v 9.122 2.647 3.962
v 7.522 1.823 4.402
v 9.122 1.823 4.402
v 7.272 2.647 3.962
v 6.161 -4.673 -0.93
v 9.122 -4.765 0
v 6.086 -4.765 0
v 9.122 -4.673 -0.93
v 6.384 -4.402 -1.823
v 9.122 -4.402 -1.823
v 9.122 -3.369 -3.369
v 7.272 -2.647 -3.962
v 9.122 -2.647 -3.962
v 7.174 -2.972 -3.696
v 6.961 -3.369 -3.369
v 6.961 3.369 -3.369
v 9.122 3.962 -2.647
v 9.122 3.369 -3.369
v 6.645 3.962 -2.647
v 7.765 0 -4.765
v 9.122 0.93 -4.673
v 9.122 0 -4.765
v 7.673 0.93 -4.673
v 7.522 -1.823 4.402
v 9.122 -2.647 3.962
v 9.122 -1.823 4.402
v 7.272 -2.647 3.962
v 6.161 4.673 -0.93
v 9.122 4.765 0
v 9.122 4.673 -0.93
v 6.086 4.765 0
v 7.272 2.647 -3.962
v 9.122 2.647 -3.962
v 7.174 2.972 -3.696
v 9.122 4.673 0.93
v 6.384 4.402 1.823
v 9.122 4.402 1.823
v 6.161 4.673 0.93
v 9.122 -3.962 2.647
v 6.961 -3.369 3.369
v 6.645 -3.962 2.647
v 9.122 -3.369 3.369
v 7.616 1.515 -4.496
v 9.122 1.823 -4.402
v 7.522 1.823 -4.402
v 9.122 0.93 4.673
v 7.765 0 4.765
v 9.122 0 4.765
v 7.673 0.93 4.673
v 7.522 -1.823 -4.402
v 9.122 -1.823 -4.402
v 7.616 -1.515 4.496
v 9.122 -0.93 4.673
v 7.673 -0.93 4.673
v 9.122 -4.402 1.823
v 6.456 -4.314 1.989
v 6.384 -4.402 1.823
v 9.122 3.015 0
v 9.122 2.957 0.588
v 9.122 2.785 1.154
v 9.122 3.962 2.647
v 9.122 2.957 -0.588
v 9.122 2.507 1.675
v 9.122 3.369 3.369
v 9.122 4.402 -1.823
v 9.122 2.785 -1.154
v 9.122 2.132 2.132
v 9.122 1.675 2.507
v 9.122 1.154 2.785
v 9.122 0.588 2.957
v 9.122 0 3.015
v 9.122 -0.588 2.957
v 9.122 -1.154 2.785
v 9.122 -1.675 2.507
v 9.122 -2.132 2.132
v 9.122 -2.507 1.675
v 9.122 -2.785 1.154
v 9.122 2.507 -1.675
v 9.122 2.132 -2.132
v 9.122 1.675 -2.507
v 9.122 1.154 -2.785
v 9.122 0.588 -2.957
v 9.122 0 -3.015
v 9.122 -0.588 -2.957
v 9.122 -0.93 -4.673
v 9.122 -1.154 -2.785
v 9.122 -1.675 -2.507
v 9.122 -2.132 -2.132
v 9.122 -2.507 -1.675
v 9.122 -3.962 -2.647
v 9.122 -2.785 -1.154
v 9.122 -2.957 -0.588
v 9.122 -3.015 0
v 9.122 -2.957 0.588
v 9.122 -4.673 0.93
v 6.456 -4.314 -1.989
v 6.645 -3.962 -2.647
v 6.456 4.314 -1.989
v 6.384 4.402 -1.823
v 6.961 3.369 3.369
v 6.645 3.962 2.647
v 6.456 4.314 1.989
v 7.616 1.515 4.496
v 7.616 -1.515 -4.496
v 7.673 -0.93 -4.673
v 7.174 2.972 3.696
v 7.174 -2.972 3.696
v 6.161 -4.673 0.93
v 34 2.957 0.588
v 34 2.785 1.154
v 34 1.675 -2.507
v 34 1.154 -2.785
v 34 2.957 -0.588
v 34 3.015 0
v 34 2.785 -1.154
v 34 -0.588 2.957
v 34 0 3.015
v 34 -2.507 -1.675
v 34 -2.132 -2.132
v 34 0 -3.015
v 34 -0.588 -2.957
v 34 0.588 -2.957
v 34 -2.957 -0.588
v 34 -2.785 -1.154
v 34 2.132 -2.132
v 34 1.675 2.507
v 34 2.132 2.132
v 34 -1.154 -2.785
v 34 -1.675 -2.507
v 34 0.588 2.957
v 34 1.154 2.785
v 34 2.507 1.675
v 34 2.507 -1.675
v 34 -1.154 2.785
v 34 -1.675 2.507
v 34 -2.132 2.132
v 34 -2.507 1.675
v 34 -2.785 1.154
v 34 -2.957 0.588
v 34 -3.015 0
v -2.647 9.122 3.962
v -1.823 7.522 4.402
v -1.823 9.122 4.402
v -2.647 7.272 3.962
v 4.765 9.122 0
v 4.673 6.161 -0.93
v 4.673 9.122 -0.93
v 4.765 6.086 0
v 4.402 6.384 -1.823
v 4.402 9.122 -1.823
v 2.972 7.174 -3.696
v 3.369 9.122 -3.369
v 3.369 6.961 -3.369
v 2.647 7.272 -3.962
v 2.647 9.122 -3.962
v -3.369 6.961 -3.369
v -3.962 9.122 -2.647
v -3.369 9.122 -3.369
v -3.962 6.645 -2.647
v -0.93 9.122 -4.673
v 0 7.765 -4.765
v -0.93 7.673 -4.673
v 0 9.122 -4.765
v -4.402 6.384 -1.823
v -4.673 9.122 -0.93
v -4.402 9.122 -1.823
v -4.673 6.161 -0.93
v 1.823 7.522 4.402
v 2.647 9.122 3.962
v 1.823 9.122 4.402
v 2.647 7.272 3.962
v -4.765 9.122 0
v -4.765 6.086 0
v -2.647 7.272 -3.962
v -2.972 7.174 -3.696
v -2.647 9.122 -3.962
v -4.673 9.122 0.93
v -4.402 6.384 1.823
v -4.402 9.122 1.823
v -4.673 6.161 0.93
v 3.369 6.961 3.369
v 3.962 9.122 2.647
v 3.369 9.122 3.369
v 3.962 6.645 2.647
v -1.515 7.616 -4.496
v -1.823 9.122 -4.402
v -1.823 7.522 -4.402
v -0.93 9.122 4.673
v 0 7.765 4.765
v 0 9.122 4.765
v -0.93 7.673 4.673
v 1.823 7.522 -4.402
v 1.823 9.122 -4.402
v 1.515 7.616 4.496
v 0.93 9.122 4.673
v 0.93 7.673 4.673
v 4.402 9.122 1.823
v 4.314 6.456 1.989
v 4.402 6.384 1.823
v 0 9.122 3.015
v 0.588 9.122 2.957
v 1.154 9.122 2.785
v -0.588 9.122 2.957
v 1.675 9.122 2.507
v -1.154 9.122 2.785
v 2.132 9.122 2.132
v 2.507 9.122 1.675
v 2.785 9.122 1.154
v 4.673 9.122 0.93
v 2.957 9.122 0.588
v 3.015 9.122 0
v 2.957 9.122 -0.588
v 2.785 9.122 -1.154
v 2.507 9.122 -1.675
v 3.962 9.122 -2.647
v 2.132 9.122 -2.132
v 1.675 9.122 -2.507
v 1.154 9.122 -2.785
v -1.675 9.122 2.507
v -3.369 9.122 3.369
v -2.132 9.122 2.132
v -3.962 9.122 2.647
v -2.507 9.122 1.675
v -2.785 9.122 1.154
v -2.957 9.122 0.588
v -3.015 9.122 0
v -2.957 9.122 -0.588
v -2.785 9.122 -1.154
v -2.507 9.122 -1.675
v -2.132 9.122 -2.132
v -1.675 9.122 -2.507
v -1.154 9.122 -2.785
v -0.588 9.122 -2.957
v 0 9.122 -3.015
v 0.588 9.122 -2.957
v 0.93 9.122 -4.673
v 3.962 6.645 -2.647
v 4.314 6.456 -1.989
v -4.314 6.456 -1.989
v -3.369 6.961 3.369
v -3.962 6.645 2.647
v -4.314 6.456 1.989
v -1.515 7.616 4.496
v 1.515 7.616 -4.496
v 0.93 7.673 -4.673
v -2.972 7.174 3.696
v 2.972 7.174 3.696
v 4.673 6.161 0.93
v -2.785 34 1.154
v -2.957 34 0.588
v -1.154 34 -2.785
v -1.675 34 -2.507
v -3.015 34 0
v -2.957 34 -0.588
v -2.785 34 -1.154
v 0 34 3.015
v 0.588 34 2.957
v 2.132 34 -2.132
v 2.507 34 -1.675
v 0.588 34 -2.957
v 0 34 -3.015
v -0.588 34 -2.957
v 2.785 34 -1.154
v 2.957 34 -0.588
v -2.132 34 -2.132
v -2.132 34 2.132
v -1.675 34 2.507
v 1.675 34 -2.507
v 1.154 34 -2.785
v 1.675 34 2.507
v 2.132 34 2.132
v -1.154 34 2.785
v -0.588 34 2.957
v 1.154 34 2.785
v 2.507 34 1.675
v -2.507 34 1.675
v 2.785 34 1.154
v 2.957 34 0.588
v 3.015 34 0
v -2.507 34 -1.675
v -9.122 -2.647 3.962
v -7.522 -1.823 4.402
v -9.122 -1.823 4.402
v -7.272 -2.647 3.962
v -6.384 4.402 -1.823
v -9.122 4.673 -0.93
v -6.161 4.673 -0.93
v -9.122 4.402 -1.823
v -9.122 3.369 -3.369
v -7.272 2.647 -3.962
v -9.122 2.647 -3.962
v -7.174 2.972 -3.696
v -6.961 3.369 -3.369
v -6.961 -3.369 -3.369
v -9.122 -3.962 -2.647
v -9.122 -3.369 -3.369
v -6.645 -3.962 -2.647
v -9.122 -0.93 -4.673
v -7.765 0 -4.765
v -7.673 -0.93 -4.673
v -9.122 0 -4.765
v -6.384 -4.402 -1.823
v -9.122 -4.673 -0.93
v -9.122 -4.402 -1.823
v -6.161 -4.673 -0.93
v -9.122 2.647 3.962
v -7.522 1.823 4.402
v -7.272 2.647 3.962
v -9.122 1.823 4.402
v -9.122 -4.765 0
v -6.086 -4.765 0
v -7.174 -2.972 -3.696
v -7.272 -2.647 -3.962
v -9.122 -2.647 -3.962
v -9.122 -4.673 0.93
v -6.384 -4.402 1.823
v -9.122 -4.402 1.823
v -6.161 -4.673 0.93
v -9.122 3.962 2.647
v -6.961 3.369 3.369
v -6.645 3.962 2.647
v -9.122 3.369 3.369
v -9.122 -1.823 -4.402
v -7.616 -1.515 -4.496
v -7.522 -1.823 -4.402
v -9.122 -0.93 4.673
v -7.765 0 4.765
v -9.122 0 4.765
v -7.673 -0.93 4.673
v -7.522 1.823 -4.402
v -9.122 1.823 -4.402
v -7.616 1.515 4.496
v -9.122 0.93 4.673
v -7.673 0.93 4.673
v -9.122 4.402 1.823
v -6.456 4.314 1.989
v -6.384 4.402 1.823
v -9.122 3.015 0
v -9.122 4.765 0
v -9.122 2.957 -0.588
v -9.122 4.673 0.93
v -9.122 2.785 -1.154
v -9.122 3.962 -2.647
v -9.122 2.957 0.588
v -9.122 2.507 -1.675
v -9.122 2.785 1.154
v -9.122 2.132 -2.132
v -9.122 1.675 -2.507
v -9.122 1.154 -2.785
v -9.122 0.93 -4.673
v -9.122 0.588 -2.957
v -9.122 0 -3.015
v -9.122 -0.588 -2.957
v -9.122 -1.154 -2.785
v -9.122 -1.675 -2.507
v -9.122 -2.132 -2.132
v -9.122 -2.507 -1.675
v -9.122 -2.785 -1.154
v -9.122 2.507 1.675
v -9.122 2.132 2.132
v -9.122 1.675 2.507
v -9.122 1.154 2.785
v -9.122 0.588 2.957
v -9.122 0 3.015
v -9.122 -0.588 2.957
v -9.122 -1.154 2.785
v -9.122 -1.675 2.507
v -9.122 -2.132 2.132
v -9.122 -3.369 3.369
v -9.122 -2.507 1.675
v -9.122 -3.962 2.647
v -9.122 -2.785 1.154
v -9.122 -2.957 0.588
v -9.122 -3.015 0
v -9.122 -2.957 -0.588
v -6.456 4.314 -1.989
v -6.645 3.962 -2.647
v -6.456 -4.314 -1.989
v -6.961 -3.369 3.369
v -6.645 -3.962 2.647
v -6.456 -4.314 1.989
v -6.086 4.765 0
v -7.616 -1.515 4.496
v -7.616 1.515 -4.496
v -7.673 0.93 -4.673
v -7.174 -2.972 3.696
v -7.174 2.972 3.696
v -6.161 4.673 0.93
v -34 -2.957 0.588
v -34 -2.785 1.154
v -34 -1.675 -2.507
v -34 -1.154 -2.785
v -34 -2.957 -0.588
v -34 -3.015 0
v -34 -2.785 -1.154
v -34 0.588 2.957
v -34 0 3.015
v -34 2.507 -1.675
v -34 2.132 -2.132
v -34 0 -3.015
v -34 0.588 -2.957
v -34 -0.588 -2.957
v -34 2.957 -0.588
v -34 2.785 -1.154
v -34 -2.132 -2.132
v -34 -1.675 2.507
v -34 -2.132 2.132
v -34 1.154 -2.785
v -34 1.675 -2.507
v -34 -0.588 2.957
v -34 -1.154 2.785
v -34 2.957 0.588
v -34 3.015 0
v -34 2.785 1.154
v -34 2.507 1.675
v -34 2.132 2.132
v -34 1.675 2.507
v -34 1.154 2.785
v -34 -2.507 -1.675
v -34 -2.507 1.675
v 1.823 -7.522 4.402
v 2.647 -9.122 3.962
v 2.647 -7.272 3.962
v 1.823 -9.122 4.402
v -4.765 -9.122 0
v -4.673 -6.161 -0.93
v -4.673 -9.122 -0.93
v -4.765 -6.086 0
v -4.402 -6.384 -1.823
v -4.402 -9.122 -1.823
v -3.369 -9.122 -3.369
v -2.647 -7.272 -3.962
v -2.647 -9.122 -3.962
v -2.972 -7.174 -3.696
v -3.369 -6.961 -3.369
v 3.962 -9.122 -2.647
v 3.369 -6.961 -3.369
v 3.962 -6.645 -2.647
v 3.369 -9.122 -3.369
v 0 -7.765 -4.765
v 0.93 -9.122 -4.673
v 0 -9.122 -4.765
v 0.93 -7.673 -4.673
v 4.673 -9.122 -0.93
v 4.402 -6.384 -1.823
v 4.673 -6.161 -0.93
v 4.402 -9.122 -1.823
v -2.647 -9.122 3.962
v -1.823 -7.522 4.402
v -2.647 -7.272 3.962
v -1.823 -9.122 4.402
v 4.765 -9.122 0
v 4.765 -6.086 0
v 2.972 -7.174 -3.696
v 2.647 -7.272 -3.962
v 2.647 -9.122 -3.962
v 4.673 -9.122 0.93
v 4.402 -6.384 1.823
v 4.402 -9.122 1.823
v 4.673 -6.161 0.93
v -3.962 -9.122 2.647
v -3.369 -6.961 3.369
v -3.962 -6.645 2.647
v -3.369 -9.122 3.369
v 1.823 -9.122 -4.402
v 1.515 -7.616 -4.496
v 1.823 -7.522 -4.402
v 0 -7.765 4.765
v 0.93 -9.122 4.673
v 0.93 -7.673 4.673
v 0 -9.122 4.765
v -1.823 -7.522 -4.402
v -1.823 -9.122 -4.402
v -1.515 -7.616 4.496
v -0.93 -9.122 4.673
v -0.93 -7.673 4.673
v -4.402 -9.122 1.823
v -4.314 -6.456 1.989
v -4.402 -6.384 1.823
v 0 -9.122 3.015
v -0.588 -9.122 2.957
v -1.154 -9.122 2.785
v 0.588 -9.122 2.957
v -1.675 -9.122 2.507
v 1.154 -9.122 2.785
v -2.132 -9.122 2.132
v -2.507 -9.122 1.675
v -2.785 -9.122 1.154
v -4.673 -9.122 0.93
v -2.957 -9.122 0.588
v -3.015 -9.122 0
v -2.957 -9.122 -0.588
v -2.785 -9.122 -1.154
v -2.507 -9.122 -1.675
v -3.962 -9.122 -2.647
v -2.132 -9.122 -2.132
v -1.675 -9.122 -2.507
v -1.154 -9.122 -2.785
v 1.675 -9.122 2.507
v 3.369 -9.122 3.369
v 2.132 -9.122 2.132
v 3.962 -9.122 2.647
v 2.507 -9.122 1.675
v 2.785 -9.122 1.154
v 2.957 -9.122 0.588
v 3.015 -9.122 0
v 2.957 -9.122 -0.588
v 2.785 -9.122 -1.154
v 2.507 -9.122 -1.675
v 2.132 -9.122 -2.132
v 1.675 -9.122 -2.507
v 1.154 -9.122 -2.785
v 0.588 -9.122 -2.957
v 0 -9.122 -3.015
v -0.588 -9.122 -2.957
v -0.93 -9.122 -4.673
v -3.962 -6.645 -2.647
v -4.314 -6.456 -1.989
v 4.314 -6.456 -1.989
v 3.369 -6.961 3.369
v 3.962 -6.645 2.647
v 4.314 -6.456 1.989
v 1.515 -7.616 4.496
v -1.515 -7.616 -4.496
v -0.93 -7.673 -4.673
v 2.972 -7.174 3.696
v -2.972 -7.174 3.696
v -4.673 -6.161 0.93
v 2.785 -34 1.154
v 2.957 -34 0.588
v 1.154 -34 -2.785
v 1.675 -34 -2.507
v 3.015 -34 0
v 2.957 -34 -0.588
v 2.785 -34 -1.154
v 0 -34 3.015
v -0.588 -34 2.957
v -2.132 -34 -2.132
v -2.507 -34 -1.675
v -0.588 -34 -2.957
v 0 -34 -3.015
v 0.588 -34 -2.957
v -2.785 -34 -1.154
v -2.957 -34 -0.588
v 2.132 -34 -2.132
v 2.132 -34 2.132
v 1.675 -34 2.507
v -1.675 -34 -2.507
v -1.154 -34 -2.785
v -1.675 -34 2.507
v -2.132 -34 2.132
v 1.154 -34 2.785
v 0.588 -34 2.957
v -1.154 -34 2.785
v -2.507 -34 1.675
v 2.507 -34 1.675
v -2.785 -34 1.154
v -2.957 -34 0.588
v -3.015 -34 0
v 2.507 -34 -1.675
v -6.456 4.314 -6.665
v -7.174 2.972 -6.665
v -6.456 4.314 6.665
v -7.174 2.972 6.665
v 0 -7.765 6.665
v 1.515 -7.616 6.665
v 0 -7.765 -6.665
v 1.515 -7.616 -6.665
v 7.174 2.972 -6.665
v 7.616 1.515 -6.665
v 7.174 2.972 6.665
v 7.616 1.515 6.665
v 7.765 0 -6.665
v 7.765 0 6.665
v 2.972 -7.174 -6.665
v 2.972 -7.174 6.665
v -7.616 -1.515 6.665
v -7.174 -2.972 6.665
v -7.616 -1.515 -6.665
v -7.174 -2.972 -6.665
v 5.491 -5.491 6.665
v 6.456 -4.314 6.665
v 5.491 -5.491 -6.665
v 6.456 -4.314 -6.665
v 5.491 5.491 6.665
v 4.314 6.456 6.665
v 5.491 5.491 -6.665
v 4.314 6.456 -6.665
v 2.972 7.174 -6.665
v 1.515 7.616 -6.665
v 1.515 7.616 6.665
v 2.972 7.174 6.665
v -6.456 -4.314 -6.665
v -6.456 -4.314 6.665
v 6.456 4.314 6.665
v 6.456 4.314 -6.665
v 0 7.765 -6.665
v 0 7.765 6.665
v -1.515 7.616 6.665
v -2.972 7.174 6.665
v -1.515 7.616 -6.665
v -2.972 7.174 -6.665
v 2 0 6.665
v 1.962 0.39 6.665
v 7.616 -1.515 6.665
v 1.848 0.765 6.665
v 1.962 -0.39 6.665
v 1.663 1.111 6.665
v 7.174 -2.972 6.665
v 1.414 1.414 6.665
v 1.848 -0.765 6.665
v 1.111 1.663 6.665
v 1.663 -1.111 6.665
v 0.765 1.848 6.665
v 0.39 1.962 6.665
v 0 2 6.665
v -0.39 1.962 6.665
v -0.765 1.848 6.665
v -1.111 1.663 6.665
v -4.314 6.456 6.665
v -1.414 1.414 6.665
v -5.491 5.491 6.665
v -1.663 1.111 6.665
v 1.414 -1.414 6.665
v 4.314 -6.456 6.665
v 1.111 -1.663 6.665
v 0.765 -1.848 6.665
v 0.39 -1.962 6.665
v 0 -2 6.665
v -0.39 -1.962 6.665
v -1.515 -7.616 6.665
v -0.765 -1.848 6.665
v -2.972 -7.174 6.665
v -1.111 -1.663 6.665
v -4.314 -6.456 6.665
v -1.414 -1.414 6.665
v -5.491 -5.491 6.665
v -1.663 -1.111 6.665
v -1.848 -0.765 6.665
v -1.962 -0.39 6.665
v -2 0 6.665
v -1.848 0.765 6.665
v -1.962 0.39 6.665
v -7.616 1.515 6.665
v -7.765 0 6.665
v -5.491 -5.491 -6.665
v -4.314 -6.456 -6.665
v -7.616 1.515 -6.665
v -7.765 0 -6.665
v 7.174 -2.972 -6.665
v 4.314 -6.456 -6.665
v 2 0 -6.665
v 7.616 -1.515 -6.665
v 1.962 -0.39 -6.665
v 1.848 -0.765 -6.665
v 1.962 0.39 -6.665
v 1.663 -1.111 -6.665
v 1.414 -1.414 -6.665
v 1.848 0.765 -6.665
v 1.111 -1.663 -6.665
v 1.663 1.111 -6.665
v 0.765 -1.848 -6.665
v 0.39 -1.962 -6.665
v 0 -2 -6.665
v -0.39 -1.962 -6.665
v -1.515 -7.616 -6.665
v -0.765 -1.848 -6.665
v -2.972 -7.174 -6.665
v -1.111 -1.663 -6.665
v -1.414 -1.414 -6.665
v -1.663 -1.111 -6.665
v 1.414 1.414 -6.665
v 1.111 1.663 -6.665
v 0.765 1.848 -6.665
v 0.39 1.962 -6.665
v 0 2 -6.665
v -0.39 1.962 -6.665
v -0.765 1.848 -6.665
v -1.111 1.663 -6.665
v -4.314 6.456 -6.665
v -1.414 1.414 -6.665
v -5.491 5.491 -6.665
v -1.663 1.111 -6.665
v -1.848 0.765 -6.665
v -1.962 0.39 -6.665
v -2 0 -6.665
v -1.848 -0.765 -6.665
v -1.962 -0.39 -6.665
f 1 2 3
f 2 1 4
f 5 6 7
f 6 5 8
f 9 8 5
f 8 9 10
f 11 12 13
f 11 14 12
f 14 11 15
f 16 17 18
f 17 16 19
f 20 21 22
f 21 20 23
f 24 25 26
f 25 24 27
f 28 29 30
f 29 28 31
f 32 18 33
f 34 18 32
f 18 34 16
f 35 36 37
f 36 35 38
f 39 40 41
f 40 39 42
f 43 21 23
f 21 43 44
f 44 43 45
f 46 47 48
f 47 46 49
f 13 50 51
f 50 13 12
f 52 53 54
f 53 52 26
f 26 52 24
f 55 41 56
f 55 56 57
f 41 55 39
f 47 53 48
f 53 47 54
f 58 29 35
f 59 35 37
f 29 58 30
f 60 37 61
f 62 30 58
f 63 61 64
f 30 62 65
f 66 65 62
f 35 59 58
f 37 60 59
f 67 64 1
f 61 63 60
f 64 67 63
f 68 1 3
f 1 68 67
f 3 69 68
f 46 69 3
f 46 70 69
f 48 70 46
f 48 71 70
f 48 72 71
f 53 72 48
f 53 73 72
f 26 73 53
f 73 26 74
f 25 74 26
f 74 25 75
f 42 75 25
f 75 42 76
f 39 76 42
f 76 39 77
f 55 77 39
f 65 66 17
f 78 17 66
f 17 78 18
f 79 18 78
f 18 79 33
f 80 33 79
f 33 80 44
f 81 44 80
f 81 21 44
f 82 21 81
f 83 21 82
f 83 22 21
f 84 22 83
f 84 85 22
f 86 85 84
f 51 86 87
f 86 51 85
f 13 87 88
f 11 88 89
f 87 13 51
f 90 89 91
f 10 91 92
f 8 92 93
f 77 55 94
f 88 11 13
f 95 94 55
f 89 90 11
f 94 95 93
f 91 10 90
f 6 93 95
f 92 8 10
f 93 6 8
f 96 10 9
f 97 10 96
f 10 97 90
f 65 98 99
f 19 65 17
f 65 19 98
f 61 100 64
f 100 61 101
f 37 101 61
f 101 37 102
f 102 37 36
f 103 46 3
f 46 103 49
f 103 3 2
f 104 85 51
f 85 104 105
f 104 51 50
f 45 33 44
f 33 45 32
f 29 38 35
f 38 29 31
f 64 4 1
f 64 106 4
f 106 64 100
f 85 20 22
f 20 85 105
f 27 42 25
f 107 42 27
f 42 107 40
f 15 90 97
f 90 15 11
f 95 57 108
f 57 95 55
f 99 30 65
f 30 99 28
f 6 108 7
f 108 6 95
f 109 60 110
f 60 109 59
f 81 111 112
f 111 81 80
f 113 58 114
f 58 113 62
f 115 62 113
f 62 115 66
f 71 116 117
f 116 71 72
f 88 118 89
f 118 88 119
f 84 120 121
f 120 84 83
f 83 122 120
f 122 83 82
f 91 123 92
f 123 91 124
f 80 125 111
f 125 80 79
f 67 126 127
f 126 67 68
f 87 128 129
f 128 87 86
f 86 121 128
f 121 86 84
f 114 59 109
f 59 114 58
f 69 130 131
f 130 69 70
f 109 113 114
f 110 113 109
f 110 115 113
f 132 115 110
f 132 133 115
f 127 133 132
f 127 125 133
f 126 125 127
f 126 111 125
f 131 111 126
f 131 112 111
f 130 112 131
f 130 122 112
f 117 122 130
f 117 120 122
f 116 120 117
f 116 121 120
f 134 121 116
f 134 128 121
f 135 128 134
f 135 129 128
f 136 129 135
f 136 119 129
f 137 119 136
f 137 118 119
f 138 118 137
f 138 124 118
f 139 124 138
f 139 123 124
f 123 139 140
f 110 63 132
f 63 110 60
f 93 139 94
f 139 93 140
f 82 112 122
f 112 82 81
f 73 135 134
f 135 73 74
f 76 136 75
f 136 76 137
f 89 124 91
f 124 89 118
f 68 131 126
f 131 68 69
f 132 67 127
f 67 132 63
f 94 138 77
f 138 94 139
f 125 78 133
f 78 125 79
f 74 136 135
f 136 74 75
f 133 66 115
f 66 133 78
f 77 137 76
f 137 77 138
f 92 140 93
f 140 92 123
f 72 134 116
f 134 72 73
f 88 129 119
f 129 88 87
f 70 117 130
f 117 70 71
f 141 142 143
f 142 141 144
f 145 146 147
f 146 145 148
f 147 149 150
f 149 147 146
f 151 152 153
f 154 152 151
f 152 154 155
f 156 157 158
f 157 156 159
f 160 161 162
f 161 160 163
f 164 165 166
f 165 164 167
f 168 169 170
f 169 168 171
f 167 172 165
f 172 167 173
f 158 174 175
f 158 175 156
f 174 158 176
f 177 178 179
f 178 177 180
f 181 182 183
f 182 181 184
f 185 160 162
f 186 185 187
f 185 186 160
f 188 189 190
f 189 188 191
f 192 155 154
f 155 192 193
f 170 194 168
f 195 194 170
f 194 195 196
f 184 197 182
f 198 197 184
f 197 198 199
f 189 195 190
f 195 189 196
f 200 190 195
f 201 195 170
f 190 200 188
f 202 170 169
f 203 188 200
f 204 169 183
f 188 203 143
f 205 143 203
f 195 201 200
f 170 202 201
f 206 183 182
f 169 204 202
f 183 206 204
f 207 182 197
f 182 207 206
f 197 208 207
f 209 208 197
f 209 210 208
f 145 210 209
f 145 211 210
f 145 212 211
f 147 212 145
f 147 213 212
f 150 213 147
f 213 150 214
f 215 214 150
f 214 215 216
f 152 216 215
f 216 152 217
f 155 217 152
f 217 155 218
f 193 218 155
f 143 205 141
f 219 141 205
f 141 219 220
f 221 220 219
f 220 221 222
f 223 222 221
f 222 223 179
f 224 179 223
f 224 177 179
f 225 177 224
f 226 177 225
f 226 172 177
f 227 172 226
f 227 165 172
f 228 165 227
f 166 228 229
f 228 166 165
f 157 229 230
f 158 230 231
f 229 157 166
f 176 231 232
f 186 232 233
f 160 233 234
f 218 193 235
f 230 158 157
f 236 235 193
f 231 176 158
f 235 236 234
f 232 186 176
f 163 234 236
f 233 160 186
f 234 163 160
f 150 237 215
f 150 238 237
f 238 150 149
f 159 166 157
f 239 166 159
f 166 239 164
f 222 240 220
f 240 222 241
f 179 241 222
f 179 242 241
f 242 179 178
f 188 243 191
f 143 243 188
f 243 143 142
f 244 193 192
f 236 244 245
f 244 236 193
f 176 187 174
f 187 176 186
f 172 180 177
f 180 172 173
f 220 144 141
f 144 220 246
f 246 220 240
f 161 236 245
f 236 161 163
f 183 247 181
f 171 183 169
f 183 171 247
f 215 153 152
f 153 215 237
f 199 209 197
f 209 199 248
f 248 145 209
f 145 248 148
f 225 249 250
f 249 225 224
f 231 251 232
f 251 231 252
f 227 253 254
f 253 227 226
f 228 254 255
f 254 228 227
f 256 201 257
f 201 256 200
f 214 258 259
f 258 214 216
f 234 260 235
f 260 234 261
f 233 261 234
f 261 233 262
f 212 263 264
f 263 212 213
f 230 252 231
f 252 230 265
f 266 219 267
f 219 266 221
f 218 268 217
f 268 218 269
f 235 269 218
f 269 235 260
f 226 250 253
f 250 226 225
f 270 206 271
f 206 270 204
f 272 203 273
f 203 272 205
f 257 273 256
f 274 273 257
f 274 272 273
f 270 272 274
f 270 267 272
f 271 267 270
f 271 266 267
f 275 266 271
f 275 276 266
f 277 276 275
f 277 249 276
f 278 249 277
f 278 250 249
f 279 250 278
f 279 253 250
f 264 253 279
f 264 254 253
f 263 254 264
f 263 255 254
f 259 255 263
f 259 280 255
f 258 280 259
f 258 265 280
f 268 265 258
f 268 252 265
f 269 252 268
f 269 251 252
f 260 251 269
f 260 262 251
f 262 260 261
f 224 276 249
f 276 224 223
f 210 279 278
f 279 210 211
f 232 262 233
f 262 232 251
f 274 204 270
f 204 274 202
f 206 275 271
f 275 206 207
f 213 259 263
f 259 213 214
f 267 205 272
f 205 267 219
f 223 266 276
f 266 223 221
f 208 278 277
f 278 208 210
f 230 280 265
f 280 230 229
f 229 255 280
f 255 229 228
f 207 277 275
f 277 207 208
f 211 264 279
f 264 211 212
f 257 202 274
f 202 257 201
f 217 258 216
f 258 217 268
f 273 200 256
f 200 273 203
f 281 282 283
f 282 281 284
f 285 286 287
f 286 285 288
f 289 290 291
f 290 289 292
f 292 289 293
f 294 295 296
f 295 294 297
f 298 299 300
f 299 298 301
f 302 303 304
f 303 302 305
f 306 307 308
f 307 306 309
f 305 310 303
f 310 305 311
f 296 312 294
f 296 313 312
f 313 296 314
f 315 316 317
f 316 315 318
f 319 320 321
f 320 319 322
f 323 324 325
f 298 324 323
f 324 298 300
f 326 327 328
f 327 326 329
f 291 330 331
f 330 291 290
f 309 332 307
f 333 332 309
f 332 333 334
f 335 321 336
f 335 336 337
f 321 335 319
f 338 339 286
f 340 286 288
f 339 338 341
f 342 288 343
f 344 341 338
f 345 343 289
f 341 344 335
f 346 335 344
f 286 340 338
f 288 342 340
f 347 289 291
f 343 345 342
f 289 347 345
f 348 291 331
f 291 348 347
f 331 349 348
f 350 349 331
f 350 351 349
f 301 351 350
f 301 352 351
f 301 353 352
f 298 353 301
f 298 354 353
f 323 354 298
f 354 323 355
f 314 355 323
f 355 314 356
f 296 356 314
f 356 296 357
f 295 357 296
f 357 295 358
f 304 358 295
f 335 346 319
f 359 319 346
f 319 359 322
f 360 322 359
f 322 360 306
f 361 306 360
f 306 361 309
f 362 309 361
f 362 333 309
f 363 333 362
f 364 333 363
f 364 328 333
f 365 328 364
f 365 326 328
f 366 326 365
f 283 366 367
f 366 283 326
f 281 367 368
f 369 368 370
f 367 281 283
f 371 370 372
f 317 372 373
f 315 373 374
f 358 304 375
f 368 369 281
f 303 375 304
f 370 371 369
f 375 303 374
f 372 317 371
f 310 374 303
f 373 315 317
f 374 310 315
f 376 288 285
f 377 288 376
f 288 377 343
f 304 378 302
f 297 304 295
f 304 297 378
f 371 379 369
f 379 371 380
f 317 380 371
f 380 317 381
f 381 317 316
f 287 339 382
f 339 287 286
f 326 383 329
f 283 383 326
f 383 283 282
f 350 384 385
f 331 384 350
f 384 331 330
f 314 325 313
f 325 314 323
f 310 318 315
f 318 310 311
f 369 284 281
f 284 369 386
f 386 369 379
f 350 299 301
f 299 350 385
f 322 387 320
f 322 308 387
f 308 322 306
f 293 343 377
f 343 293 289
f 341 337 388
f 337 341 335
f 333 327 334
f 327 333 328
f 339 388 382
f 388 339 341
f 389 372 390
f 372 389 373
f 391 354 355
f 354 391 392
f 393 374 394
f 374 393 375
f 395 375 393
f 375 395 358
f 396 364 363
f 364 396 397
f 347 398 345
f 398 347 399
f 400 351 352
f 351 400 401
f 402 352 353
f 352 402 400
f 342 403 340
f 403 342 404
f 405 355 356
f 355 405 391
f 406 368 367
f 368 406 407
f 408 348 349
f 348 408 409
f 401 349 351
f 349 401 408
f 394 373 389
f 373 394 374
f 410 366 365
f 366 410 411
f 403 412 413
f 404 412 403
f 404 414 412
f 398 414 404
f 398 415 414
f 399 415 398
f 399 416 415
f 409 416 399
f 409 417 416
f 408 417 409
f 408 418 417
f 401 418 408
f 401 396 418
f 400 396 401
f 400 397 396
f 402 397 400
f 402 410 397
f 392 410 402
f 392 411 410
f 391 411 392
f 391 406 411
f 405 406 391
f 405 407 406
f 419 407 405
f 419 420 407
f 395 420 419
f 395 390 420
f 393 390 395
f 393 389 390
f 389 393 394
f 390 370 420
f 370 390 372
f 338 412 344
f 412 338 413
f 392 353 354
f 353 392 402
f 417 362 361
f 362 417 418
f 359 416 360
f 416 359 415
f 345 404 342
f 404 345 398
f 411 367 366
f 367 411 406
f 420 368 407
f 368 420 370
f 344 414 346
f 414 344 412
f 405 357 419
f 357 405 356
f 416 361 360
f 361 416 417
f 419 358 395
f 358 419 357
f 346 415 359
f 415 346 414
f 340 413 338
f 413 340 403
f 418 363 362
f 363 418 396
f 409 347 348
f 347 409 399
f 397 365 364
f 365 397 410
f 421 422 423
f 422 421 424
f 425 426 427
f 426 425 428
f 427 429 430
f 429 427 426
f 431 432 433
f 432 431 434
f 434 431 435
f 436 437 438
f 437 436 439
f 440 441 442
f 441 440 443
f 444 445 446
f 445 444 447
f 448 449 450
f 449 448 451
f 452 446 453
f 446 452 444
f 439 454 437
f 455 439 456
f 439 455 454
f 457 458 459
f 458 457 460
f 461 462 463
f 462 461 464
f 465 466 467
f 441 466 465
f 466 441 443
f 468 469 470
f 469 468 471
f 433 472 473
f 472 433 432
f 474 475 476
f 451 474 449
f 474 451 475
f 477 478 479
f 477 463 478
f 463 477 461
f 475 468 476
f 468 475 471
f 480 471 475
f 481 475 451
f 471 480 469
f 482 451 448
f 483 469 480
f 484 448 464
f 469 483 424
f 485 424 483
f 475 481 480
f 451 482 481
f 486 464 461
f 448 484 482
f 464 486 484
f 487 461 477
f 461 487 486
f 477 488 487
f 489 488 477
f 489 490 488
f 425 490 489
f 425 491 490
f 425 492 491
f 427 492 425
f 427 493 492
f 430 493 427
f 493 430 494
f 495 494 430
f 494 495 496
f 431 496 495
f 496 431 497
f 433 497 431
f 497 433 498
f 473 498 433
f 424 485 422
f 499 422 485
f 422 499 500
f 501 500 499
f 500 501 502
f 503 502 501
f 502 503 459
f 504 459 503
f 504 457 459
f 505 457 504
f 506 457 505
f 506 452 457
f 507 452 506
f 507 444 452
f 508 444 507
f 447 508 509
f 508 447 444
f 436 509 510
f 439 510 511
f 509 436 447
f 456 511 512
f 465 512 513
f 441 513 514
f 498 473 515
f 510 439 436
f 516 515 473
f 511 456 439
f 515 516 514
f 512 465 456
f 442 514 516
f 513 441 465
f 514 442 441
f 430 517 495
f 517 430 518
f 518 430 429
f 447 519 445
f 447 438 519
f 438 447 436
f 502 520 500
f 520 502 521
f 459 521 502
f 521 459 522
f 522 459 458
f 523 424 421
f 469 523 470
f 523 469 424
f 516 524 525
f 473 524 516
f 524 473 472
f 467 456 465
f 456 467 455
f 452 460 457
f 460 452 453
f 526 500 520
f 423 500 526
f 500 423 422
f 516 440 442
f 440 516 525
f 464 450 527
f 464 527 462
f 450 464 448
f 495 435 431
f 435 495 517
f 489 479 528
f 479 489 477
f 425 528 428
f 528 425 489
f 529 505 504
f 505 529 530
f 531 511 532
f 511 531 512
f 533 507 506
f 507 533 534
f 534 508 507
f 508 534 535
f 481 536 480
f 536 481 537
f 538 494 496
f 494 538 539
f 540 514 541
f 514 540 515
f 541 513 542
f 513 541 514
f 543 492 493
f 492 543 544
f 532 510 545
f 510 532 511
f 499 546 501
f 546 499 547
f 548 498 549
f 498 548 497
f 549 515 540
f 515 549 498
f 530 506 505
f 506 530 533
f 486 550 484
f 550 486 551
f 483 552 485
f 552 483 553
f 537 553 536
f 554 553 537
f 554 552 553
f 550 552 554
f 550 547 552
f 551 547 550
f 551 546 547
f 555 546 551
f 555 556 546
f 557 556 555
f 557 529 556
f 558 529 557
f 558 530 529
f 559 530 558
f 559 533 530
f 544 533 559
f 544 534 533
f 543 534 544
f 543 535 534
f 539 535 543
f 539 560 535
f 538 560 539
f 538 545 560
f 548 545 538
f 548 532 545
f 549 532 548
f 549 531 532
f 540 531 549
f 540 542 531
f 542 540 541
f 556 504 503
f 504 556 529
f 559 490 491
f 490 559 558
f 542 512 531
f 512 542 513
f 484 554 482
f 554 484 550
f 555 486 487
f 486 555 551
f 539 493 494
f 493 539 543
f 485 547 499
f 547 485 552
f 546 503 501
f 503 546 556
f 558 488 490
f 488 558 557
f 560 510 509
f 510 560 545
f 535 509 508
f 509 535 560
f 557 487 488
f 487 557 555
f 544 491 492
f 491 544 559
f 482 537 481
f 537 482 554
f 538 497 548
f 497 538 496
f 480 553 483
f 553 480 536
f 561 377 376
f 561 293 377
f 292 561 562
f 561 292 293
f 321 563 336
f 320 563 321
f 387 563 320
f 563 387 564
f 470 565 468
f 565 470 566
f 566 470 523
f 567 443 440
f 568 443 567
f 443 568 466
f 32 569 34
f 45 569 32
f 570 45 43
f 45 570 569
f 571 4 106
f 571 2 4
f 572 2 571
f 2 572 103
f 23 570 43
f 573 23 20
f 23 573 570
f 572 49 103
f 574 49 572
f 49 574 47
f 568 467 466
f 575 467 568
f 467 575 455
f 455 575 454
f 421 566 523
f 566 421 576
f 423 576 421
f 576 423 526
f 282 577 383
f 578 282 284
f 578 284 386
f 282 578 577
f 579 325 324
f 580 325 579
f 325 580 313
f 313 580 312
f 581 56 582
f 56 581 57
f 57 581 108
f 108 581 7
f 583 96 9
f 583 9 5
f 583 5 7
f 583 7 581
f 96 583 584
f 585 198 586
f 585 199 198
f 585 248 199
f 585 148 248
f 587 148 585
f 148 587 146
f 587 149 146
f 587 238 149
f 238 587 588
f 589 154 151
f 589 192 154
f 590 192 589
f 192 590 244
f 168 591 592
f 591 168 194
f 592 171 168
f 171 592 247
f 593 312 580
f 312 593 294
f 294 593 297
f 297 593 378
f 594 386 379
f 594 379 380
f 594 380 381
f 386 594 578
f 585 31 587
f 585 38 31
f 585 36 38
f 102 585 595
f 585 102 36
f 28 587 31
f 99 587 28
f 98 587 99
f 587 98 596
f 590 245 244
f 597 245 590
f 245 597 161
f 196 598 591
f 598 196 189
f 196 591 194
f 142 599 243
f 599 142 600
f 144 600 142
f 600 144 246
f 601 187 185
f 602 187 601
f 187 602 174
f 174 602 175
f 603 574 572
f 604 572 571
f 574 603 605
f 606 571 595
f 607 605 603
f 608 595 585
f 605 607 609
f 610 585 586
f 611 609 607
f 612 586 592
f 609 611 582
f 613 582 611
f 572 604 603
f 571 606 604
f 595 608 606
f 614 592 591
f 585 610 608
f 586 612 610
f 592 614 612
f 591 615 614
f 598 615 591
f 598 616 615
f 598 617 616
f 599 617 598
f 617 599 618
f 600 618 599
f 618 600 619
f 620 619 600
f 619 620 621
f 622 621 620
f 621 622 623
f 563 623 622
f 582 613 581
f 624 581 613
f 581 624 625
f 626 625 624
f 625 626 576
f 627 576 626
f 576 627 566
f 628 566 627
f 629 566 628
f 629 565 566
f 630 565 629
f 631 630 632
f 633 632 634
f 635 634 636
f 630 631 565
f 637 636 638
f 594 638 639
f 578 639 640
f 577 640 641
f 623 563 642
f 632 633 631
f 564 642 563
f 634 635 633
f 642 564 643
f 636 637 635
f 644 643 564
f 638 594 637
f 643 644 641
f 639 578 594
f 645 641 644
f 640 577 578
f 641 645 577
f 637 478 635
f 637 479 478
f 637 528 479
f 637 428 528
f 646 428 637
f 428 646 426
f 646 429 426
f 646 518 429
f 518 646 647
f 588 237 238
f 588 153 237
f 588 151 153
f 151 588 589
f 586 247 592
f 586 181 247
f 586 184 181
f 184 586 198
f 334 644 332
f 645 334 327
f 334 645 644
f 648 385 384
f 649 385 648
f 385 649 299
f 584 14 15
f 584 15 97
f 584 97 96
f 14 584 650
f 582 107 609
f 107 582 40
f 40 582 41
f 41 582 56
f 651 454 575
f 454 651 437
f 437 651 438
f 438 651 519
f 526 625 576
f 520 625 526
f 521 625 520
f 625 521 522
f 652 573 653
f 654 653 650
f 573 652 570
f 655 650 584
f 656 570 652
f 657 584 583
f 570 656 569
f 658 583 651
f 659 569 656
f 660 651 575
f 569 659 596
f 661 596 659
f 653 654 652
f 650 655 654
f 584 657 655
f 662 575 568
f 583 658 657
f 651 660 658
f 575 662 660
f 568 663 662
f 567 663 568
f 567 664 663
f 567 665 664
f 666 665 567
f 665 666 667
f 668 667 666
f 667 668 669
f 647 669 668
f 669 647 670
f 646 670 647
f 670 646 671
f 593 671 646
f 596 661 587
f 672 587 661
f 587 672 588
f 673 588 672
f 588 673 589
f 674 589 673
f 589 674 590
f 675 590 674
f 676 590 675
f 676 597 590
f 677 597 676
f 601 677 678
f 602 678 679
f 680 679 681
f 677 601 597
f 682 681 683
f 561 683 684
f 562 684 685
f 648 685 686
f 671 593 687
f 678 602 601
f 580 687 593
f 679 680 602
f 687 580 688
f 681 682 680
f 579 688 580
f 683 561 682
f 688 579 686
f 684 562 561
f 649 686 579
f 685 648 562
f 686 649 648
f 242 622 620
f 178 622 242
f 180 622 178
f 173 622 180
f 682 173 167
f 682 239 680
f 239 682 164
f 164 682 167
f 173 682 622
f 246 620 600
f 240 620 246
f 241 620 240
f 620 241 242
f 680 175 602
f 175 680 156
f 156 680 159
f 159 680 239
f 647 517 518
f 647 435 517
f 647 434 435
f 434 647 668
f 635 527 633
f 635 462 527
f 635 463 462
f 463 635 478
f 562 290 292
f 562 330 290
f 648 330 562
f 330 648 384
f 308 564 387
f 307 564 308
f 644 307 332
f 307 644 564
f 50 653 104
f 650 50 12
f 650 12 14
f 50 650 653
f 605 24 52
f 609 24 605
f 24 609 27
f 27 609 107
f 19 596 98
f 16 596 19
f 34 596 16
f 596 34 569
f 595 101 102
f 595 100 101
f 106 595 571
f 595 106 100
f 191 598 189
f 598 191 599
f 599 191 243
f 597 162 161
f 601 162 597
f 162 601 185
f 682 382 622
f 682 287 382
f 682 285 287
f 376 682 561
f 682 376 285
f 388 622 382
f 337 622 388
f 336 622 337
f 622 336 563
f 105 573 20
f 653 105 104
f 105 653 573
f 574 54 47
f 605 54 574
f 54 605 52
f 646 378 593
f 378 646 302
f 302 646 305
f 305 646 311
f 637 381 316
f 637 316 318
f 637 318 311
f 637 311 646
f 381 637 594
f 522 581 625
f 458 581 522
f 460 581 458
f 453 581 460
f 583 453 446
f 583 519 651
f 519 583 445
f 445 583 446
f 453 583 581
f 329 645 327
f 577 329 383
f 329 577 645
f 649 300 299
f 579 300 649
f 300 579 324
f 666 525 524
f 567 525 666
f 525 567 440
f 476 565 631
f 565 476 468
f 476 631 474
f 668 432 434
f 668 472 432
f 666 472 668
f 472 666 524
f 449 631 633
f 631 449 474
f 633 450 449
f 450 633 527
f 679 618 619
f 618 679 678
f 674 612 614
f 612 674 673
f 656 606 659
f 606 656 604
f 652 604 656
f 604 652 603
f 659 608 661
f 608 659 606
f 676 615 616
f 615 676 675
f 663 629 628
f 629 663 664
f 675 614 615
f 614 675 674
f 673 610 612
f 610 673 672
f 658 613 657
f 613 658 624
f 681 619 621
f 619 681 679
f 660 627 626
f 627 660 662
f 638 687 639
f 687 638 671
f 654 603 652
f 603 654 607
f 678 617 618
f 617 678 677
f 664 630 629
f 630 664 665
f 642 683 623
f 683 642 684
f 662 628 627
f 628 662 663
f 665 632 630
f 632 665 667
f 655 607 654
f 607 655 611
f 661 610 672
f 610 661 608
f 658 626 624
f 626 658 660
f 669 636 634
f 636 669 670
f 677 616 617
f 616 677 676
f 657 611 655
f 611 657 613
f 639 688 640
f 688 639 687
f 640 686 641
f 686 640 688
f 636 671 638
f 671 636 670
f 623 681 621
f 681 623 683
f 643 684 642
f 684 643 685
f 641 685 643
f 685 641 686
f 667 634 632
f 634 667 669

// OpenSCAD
$fn = 32;

// ----------------------------------------------------------------------
// Cardan cross: 68 mm span, 9.53 mm trunnions
// ----------------------------------------------------------------------

// --- parameters (mm) ---
journal_d = 9.53;         // trunnion diameter
arm_len = 34;             // trunnion length from the centre
step_r = 3.24;            // step position from the centre
step_d = 6.03;            // journal diameter after the step
hub_d = 15.53;            // hub diameter
hub_h = 13.33;            // hub height
bore_d = 4;               // hub bore

difference() {
  union() {
    /* hub along the joint axis */
    cylinder(h = hub_h, d = hub_d, center = true);
    for (a = [0 : 90 : 270]) rotate([0, 0, a]) {
      /* trunnion, sunk into the hub */
      translate([hub_d / 4, 0, 0]) rotate([0, 90, 0]) cylinder(h = step_r + 2, d = journal_d);
      /* stepped journal out to the tip */
      translate([step_r - 0.5, 0, 0]) rotate([0, 90, 0]) cylinder(h = arm_len + 0.5 - step_r, d = step_d);
    }
  }
  /* lubrication bore through the hub, 2.5 mm clear on both sides */
  translate([0, 0, -hub_h / 2 - 2.5]) cylinder(h = hub_h + 5, d = bore_d);
}
